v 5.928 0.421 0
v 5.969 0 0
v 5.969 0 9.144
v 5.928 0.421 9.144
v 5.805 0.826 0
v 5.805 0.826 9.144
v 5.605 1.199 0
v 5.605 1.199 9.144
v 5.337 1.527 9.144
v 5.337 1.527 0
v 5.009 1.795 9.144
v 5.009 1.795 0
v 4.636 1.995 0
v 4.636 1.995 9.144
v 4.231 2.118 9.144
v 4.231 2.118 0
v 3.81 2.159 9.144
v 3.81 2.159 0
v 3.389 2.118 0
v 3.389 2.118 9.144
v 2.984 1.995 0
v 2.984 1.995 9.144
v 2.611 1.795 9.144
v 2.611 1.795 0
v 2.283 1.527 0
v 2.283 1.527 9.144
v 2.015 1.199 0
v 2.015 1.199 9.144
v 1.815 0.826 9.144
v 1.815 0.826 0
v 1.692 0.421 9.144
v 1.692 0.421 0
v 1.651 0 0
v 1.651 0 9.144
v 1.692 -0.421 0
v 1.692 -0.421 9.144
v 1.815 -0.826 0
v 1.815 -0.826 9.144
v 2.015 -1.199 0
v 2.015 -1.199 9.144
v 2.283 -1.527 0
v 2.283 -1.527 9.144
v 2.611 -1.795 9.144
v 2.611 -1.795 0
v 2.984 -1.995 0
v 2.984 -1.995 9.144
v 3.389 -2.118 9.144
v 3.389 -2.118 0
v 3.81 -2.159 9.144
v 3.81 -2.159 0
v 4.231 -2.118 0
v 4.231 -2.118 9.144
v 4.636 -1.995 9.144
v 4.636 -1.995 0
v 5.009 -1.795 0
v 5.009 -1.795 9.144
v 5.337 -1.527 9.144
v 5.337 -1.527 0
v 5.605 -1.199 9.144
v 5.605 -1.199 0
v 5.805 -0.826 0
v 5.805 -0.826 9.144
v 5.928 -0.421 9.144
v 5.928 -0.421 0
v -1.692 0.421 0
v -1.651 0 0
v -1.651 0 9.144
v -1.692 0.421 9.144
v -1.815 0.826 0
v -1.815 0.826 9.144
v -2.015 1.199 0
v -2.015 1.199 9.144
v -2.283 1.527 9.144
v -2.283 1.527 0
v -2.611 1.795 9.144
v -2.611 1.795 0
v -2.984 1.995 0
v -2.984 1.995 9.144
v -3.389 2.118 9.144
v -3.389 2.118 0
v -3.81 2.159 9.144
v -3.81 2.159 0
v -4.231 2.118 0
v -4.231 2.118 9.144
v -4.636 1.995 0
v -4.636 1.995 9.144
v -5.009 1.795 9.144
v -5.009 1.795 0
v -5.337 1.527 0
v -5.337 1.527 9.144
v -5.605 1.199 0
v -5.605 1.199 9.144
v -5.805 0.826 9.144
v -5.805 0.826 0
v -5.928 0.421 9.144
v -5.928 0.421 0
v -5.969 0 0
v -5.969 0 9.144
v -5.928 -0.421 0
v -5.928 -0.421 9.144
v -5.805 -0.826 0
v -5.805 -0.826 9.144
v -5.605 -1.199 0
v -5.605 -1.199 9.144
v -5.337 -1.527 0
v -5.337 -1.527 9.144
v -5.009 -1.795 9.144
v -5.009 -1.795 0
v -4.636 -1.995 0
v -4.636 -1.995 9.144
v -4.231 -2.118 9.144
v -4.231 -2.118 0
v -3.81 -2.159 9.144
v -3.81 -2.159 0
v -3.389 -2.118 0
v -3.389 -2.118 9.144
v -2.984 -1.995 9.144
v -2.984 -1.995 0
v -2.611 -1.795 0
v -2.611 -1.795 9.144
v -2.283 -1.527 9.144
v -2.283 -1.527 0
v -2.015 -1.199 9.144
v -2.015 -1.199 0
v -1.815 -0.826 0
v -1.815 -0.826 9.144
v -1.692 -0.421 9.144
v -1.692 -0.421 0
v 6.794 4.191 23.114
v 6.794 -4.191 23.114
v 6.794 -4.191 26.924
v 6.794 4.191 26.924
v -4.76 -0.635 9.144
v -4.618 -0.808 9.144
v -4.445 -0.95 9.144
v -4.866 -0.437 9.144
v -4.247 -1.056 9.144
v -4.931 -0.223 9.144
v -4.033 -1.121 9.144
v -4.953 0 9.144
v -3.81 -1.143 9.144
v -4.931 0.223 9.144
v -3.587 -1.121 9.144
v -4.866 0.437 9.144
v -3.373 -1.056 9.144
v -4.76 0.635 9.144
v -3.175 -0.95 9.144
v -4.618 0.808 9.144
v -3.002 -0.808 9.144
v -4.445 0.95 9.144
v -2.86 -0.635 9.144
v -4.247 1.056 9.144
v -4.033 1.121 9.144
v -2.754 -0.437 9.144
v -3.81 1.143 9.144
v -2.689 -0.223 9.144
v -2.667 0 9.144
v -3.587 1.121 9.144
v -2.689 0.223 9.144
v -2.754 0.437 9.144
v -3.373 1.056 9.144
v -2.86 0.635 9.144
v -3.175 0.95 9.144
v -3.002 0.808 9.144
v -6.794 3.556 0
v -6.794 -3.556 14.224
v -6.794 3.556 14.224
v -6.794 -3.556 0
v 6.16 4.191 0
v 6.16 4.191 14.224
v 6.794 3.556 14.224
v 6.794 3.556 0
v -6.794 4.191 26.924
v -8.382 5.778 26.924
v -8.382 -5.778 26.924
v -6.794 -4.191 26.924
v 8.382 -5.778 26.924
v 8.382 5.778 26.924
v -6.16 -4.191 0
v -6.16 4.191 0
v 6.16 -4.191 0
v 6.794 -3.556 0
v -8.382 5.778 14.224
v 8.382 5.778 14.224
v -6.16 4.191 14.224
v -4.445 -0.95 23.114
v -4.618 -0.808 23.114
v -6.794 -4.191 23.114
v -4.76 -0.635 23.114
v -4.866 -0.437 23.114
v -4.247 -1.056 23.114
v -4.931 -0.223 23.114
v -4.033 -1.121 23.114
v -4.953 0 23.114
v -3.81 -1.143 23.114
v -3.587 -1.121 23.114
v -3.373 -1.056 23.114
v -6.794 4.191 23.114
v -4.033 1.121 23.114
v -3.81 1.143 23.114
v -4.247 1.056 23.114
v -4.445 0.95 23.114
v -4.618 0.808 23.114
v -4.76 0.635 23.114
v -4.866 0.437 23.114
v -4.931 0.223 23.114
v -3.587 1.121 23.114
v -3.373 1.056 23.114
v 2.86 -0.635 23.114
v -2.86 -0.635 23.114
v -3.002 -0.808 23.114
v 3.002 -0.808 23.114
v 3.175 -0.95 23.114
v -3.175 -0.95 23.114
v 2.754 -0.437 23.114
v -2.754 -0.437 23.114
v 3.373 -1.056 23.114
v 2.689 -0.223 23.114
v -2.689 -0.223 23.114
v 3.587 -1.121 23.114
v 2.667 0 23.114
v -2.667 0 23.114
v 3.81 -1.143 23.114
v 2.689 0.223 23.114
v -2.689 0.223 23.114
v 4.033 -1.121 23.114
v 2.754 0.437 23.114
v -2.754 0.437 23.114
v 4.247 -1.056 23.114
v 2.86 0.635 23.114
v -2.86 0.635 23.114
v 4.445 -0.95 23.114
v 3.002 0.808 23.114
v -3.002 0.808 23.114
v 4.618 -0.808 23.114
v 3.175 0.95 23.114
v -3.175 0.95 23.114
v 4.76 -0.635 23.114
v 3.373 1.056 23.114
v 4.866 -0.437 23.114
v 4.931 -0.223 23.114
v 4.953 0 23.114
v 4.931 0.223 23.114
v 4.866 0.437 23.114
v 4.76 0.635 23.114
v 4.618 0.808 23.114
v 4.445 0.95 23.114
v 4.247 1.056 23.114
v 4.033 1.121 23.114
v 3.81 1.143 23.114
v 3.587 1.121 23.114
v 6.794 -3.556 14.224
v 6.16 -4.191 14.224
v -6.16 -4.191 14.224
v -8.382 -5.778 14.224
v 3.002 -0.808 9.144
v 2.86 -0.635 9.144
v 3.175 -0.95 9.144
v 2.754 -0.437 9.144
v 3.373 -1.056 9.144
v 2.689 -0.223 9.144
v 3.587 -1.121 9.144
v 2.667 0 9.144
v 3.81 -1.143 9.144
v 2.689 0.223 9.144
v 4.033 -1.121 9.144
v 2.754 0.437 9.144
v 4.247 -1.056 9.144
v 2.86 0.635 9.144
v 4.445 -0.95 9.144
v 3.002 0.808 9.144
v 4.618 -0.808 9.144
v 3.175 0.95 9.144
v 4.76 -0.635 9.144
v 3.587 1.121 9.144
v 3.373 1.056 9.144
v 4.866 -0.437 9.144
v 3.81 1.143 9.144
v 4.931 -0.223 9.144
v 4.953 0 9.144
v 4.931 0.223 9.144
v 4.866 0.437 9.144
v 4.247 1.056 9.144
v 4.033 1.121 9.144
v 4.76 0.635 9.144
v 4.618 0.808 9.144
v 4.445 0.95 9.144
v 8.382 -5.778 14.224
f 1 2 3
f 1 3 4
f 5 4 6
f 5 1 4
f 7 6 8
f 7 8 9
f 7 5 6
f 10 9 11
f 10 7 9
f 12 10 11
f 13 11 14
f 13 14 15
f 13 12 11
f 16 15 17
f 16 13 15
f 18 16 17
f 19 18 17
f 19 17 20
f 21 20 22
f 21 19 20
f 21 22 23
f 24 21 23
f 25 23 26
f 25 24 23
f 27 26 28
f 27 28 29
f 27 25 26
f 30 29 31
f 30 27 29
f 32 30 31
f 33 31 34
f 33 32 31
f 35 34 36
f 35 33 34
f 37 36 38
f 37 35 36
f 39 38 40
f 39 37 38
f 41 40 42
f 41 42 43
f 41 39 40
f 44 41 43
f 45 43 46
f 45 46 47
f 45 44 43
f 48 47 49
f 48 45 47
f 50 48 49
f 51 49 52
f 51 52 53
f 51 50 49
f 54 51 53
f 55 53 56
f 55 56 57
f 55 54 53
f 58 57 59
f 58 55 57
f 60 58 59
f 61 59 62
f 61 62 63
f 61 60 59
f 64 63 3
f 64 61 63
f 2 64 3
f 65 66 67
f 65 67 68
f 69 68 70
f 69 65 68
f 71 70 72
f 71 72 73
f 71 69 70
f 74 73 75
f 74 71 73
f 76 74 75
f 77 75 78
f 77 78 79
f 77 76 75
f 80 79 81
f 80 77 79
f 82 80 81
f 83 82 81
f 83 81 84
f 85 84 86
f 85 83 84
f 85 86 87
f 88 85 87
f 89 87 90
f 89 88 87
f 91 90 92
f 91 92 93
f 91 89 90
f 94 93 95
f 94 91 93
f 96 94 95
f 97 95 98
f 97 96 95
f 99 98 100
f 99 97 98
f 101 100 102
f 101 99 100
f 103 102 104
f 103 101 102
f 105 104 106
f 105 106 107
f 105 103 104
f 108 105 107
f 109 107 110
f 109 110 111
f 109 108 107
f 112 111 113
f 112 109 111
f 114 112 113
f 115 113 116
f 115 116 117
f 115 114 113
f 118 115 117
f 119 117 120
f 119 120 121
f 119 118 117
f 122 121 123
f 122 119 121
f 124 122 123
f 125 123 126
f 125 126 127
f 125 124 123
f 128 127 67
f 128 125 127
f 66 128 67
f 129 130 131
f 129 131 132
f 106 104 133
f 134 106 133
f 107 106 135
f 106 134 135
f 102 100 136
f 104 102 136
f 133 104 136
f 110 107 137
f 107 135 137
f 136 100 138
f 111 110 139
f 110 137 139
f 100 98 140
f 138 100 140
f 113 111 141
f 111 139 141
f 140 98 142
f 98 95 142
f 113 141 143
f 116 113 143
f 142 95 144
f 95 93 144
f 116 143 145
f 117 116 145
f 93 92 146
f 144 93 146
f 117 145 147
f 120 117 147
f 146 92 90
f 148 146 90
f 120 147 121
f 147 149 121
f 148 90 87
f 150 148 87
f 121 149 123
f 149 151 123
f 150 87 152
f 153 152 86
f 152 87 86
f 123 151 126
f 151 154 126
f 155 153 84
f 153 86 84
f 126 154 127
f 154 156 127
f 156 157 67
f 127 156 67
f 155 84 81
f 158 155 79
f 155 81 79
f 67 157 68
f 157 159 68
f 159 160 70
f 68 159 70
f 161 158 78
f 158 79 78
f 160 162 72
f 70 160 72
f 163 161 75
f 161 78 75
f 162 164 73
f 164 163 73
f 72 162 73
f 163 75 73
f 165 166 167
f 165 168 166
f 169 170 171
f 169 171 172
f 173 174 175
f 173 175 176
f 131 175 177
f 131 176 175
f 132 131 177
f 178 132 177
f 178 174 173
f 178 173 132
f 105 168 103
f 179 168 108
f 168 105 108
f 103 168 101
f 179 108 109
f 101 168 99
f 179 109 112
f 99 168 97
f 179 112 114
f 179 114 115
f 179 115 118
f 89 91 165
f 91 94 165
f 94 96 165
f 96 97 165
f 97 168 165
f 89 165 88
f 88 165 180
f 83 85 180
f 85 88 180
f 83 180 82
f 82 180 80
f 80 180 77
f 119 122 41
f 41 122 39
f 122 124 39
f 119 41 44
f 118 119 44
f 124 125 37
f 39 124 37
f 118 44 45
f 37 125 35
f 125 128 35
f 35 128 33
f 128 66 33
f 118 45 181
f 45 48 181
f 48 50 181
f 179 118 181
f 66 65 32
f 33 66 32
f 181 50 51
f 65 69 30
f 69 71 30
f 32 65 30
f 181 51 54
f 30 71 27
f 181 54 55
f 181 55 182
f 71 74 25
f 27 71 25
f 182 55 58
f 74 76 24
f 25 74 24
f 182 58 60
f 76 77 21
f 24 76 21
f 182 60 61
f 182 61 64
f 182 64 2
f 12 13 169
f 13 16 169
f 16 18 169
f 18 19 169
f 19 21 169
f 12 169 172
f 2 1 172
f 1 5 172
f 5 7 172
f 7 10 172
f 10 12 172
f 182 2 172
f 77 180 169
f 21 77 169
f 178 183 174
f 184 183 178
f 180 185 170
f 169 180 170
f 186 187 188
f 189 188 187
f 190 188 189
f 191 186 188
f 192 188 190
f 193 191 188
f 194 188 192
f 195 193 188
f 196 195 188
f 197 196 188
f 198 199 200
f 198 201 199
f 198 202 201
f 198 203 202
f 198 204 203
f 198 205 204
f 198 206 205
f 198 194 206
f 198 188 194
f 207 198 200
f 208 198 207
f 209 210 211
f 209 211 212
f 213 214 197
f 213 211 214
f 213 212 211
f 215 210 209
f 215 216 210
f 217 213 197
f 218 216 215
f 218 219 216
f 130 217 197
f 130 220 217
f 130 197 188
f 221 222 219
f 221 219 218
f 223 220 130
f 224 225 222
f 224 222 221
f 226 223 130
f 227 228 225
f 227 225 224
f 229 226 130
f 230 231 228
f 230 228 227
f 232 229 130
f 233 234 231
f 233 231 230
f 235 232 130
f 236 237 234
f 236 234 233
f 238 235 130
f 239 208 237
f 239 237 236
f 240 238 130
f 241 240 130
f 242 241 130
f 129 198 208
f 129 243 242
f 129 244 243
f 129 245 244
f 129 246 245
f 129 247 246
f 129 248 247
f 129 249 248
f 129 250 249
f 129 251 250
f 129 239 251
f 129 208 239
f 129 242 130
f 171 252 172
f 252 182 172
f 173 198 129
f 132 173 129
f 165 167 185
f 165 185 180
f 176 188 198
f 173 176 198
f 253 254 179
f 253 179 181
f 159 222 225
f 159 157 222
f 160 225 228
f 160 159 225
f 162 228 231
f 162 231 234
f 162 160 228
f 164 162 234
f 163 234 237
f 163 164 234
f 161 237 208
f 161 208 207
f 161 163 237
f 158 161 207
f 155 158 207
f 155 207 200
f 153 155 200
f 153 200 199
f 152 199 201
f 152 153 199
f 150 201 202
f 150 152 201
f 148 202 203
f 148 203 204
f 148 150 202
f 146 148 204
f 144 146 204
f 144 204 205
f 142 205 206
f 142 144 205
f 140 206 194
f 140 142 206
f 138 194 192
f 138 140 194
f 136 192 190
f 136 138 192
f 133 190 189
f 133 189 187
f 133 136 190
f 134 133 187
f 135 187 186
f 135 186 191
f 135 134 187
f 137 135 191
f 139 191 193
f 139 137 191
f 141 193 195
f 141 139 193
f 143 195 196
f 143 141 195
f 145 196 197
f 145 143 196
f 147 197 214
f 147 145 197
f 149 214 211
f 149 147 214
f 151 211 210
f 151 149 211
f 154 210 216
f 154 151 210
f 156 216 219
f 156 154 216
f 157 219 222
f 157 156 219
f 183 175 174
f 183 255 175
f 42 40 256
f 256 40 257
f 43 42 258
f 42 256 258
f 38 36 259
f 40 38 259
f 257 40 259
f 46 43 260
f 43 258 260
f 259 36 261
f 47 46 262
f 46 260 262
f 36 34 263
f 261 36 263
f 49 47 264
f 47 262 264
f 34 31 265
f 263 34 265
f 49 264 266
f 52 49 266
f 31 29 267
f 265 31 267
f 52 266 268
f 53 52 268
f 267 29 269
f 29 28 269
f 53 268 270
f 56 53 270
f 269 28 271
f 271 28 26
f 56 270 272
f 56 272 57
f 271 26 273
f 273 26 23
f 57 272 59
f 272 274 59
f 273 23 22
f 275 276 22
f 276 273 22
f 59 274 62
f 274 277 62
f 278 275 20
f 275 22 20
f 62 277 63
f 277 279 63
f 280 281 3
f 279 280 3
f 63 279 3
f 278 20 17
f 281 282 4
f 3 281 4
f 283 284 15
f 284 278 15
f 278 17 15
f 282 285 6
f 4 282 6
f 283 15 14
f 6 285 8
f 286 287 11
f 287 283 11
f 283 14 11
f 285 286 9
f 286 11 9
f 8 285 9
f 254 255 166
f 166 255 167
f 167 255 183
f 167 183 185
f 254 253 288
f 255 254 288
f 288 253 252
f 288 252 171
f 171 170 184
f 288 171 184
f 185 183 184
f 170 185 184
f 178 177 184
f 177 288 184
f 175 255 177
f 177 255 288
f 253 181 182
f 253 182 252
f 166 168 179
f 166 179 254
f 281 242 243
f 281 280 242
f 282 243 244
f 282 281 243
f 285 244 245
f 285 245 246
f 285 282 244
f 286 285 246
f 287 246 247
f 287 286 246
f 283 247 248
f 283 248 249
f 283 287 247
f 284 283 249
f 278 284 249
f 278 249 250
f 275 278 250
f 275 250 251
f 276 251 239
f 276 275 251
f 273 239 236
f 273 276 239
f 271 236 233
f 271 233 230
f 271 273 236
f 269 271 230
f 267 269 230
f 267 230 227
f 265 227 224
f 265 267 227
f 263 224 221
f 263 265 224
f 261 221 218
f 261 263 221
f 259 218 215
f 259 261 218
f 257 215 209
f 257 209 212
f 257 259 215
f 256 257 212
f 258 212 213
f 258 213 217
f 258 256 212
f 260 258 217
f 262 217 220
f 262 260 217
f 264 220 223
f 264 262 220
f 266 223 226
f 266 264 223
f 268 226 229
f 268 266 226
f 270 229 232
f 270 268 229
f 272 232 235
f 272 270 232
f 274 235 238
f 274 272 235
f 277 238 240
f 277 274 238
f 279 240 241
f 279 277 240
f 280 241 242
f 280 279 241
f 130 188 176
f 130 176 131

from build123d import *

# Parameters (mm, degrees)
F0_W     = 13.589
F0_H     = 8.382
F0_R     = 2.159
F1_DEPTH = 9.144
F2_W     = 13.589
F2_H     = 8.382
F2_R     = 2.159
F2_R_2   = 1.143
F3_DEPTH = 5.08
F4_W     = 16.764
F4_H     = 11.557
F4_W_2   = 13.589
F4_H_2   = 8.382
F4_R     = 1.143
F5_DEPTH = 8.89
F6_SIZE  = 0.635
F7_W     = 16.764
F7_H     = 11.557
F7_W_2   = 13.589
F7_H_2   = 8.382
F8_DEPTH = 3.81


with BuildPart() as f1:
    # F0 (on Top) → F1 (new body)
    with BuildSketch(Plane.XY):
        Rectangle(F0_W, F0_H)
        with Locations((-3.81, 0)):
            Circle(F0_R, mode=Mode.SUBTRACT)
        with Locations((3.81, 0)):
            Circle(F0_R, mode=Mode.SUBTRACT)
    extrude(amount=F1_DEPTH)

    # F2 (on face) → F3 (join)
    with BuildSketch(Plane.XY.offset(9.144)):
        Rectangle(F2_W, F2_H)
        with Locations((-3.81, 0)):
            Circle(F2_R, mode=Mode.SUBTRACT)
        with Locations((3.81, 0)):
            Circle(F2_R, mode=Mode.SUBTRACT)
        with Locations((-3.81, 0)):
            Circle(F2_R)
        with Locations((-3.81, 0)):
            Circle(F2_R_2, mode=Mode.SUBTRACT)
        with Locations((3.81, 0)):
            Circle(F2_R)
        with Locations((3.81, 0)):
            Circle(F2_R_2, mode=Mode.SUBTRACT)
    extrude(amount=F3_DEPTH)

    # F4 (on face) → F5 (join)
    with BuildSketch(Plane.XY.offset(14.224)):
        Rectangle(F4_W, F4_H)
        Rectangle(F4_W_2, F4_H_2, mode=Mode.SUBTRACT)
        Rectangle(F4_W_2, F4_H_2)
        with Locations((-3.81, 0)):
            Circle(F4_R, mode=Mode.SUBTRACT)
        with Locations((3.81, 0)):
            Circle(F4_R, mode=Mode.SUBTRACT)
    extrude(amount=F5_DEPTH)

    # F6
    f6_edges = [f1.edges().sort_by_distance(p)[0] for p in [
        (-6.7945, 4.191, 7.112),
        (-6.7945, -4.191, 7.112),
        (6.7945, 4.191, 7.112),
        (6.7945, -4.191, 7.112),
    ]]
    chamfer(f6_edges, length=F6_SIZE)

    # F7 (on face) → F8 (join)
    with BuildSketch(Plane.XY.offset(23.114)):
        Rectangle(F7_W, F7_H)
        Rectangle(F7_W_2, F7_H_2, mode=Mode.SUBTRACT)
    extrude(amount=F8_DEPTH)


solid = f1.part
